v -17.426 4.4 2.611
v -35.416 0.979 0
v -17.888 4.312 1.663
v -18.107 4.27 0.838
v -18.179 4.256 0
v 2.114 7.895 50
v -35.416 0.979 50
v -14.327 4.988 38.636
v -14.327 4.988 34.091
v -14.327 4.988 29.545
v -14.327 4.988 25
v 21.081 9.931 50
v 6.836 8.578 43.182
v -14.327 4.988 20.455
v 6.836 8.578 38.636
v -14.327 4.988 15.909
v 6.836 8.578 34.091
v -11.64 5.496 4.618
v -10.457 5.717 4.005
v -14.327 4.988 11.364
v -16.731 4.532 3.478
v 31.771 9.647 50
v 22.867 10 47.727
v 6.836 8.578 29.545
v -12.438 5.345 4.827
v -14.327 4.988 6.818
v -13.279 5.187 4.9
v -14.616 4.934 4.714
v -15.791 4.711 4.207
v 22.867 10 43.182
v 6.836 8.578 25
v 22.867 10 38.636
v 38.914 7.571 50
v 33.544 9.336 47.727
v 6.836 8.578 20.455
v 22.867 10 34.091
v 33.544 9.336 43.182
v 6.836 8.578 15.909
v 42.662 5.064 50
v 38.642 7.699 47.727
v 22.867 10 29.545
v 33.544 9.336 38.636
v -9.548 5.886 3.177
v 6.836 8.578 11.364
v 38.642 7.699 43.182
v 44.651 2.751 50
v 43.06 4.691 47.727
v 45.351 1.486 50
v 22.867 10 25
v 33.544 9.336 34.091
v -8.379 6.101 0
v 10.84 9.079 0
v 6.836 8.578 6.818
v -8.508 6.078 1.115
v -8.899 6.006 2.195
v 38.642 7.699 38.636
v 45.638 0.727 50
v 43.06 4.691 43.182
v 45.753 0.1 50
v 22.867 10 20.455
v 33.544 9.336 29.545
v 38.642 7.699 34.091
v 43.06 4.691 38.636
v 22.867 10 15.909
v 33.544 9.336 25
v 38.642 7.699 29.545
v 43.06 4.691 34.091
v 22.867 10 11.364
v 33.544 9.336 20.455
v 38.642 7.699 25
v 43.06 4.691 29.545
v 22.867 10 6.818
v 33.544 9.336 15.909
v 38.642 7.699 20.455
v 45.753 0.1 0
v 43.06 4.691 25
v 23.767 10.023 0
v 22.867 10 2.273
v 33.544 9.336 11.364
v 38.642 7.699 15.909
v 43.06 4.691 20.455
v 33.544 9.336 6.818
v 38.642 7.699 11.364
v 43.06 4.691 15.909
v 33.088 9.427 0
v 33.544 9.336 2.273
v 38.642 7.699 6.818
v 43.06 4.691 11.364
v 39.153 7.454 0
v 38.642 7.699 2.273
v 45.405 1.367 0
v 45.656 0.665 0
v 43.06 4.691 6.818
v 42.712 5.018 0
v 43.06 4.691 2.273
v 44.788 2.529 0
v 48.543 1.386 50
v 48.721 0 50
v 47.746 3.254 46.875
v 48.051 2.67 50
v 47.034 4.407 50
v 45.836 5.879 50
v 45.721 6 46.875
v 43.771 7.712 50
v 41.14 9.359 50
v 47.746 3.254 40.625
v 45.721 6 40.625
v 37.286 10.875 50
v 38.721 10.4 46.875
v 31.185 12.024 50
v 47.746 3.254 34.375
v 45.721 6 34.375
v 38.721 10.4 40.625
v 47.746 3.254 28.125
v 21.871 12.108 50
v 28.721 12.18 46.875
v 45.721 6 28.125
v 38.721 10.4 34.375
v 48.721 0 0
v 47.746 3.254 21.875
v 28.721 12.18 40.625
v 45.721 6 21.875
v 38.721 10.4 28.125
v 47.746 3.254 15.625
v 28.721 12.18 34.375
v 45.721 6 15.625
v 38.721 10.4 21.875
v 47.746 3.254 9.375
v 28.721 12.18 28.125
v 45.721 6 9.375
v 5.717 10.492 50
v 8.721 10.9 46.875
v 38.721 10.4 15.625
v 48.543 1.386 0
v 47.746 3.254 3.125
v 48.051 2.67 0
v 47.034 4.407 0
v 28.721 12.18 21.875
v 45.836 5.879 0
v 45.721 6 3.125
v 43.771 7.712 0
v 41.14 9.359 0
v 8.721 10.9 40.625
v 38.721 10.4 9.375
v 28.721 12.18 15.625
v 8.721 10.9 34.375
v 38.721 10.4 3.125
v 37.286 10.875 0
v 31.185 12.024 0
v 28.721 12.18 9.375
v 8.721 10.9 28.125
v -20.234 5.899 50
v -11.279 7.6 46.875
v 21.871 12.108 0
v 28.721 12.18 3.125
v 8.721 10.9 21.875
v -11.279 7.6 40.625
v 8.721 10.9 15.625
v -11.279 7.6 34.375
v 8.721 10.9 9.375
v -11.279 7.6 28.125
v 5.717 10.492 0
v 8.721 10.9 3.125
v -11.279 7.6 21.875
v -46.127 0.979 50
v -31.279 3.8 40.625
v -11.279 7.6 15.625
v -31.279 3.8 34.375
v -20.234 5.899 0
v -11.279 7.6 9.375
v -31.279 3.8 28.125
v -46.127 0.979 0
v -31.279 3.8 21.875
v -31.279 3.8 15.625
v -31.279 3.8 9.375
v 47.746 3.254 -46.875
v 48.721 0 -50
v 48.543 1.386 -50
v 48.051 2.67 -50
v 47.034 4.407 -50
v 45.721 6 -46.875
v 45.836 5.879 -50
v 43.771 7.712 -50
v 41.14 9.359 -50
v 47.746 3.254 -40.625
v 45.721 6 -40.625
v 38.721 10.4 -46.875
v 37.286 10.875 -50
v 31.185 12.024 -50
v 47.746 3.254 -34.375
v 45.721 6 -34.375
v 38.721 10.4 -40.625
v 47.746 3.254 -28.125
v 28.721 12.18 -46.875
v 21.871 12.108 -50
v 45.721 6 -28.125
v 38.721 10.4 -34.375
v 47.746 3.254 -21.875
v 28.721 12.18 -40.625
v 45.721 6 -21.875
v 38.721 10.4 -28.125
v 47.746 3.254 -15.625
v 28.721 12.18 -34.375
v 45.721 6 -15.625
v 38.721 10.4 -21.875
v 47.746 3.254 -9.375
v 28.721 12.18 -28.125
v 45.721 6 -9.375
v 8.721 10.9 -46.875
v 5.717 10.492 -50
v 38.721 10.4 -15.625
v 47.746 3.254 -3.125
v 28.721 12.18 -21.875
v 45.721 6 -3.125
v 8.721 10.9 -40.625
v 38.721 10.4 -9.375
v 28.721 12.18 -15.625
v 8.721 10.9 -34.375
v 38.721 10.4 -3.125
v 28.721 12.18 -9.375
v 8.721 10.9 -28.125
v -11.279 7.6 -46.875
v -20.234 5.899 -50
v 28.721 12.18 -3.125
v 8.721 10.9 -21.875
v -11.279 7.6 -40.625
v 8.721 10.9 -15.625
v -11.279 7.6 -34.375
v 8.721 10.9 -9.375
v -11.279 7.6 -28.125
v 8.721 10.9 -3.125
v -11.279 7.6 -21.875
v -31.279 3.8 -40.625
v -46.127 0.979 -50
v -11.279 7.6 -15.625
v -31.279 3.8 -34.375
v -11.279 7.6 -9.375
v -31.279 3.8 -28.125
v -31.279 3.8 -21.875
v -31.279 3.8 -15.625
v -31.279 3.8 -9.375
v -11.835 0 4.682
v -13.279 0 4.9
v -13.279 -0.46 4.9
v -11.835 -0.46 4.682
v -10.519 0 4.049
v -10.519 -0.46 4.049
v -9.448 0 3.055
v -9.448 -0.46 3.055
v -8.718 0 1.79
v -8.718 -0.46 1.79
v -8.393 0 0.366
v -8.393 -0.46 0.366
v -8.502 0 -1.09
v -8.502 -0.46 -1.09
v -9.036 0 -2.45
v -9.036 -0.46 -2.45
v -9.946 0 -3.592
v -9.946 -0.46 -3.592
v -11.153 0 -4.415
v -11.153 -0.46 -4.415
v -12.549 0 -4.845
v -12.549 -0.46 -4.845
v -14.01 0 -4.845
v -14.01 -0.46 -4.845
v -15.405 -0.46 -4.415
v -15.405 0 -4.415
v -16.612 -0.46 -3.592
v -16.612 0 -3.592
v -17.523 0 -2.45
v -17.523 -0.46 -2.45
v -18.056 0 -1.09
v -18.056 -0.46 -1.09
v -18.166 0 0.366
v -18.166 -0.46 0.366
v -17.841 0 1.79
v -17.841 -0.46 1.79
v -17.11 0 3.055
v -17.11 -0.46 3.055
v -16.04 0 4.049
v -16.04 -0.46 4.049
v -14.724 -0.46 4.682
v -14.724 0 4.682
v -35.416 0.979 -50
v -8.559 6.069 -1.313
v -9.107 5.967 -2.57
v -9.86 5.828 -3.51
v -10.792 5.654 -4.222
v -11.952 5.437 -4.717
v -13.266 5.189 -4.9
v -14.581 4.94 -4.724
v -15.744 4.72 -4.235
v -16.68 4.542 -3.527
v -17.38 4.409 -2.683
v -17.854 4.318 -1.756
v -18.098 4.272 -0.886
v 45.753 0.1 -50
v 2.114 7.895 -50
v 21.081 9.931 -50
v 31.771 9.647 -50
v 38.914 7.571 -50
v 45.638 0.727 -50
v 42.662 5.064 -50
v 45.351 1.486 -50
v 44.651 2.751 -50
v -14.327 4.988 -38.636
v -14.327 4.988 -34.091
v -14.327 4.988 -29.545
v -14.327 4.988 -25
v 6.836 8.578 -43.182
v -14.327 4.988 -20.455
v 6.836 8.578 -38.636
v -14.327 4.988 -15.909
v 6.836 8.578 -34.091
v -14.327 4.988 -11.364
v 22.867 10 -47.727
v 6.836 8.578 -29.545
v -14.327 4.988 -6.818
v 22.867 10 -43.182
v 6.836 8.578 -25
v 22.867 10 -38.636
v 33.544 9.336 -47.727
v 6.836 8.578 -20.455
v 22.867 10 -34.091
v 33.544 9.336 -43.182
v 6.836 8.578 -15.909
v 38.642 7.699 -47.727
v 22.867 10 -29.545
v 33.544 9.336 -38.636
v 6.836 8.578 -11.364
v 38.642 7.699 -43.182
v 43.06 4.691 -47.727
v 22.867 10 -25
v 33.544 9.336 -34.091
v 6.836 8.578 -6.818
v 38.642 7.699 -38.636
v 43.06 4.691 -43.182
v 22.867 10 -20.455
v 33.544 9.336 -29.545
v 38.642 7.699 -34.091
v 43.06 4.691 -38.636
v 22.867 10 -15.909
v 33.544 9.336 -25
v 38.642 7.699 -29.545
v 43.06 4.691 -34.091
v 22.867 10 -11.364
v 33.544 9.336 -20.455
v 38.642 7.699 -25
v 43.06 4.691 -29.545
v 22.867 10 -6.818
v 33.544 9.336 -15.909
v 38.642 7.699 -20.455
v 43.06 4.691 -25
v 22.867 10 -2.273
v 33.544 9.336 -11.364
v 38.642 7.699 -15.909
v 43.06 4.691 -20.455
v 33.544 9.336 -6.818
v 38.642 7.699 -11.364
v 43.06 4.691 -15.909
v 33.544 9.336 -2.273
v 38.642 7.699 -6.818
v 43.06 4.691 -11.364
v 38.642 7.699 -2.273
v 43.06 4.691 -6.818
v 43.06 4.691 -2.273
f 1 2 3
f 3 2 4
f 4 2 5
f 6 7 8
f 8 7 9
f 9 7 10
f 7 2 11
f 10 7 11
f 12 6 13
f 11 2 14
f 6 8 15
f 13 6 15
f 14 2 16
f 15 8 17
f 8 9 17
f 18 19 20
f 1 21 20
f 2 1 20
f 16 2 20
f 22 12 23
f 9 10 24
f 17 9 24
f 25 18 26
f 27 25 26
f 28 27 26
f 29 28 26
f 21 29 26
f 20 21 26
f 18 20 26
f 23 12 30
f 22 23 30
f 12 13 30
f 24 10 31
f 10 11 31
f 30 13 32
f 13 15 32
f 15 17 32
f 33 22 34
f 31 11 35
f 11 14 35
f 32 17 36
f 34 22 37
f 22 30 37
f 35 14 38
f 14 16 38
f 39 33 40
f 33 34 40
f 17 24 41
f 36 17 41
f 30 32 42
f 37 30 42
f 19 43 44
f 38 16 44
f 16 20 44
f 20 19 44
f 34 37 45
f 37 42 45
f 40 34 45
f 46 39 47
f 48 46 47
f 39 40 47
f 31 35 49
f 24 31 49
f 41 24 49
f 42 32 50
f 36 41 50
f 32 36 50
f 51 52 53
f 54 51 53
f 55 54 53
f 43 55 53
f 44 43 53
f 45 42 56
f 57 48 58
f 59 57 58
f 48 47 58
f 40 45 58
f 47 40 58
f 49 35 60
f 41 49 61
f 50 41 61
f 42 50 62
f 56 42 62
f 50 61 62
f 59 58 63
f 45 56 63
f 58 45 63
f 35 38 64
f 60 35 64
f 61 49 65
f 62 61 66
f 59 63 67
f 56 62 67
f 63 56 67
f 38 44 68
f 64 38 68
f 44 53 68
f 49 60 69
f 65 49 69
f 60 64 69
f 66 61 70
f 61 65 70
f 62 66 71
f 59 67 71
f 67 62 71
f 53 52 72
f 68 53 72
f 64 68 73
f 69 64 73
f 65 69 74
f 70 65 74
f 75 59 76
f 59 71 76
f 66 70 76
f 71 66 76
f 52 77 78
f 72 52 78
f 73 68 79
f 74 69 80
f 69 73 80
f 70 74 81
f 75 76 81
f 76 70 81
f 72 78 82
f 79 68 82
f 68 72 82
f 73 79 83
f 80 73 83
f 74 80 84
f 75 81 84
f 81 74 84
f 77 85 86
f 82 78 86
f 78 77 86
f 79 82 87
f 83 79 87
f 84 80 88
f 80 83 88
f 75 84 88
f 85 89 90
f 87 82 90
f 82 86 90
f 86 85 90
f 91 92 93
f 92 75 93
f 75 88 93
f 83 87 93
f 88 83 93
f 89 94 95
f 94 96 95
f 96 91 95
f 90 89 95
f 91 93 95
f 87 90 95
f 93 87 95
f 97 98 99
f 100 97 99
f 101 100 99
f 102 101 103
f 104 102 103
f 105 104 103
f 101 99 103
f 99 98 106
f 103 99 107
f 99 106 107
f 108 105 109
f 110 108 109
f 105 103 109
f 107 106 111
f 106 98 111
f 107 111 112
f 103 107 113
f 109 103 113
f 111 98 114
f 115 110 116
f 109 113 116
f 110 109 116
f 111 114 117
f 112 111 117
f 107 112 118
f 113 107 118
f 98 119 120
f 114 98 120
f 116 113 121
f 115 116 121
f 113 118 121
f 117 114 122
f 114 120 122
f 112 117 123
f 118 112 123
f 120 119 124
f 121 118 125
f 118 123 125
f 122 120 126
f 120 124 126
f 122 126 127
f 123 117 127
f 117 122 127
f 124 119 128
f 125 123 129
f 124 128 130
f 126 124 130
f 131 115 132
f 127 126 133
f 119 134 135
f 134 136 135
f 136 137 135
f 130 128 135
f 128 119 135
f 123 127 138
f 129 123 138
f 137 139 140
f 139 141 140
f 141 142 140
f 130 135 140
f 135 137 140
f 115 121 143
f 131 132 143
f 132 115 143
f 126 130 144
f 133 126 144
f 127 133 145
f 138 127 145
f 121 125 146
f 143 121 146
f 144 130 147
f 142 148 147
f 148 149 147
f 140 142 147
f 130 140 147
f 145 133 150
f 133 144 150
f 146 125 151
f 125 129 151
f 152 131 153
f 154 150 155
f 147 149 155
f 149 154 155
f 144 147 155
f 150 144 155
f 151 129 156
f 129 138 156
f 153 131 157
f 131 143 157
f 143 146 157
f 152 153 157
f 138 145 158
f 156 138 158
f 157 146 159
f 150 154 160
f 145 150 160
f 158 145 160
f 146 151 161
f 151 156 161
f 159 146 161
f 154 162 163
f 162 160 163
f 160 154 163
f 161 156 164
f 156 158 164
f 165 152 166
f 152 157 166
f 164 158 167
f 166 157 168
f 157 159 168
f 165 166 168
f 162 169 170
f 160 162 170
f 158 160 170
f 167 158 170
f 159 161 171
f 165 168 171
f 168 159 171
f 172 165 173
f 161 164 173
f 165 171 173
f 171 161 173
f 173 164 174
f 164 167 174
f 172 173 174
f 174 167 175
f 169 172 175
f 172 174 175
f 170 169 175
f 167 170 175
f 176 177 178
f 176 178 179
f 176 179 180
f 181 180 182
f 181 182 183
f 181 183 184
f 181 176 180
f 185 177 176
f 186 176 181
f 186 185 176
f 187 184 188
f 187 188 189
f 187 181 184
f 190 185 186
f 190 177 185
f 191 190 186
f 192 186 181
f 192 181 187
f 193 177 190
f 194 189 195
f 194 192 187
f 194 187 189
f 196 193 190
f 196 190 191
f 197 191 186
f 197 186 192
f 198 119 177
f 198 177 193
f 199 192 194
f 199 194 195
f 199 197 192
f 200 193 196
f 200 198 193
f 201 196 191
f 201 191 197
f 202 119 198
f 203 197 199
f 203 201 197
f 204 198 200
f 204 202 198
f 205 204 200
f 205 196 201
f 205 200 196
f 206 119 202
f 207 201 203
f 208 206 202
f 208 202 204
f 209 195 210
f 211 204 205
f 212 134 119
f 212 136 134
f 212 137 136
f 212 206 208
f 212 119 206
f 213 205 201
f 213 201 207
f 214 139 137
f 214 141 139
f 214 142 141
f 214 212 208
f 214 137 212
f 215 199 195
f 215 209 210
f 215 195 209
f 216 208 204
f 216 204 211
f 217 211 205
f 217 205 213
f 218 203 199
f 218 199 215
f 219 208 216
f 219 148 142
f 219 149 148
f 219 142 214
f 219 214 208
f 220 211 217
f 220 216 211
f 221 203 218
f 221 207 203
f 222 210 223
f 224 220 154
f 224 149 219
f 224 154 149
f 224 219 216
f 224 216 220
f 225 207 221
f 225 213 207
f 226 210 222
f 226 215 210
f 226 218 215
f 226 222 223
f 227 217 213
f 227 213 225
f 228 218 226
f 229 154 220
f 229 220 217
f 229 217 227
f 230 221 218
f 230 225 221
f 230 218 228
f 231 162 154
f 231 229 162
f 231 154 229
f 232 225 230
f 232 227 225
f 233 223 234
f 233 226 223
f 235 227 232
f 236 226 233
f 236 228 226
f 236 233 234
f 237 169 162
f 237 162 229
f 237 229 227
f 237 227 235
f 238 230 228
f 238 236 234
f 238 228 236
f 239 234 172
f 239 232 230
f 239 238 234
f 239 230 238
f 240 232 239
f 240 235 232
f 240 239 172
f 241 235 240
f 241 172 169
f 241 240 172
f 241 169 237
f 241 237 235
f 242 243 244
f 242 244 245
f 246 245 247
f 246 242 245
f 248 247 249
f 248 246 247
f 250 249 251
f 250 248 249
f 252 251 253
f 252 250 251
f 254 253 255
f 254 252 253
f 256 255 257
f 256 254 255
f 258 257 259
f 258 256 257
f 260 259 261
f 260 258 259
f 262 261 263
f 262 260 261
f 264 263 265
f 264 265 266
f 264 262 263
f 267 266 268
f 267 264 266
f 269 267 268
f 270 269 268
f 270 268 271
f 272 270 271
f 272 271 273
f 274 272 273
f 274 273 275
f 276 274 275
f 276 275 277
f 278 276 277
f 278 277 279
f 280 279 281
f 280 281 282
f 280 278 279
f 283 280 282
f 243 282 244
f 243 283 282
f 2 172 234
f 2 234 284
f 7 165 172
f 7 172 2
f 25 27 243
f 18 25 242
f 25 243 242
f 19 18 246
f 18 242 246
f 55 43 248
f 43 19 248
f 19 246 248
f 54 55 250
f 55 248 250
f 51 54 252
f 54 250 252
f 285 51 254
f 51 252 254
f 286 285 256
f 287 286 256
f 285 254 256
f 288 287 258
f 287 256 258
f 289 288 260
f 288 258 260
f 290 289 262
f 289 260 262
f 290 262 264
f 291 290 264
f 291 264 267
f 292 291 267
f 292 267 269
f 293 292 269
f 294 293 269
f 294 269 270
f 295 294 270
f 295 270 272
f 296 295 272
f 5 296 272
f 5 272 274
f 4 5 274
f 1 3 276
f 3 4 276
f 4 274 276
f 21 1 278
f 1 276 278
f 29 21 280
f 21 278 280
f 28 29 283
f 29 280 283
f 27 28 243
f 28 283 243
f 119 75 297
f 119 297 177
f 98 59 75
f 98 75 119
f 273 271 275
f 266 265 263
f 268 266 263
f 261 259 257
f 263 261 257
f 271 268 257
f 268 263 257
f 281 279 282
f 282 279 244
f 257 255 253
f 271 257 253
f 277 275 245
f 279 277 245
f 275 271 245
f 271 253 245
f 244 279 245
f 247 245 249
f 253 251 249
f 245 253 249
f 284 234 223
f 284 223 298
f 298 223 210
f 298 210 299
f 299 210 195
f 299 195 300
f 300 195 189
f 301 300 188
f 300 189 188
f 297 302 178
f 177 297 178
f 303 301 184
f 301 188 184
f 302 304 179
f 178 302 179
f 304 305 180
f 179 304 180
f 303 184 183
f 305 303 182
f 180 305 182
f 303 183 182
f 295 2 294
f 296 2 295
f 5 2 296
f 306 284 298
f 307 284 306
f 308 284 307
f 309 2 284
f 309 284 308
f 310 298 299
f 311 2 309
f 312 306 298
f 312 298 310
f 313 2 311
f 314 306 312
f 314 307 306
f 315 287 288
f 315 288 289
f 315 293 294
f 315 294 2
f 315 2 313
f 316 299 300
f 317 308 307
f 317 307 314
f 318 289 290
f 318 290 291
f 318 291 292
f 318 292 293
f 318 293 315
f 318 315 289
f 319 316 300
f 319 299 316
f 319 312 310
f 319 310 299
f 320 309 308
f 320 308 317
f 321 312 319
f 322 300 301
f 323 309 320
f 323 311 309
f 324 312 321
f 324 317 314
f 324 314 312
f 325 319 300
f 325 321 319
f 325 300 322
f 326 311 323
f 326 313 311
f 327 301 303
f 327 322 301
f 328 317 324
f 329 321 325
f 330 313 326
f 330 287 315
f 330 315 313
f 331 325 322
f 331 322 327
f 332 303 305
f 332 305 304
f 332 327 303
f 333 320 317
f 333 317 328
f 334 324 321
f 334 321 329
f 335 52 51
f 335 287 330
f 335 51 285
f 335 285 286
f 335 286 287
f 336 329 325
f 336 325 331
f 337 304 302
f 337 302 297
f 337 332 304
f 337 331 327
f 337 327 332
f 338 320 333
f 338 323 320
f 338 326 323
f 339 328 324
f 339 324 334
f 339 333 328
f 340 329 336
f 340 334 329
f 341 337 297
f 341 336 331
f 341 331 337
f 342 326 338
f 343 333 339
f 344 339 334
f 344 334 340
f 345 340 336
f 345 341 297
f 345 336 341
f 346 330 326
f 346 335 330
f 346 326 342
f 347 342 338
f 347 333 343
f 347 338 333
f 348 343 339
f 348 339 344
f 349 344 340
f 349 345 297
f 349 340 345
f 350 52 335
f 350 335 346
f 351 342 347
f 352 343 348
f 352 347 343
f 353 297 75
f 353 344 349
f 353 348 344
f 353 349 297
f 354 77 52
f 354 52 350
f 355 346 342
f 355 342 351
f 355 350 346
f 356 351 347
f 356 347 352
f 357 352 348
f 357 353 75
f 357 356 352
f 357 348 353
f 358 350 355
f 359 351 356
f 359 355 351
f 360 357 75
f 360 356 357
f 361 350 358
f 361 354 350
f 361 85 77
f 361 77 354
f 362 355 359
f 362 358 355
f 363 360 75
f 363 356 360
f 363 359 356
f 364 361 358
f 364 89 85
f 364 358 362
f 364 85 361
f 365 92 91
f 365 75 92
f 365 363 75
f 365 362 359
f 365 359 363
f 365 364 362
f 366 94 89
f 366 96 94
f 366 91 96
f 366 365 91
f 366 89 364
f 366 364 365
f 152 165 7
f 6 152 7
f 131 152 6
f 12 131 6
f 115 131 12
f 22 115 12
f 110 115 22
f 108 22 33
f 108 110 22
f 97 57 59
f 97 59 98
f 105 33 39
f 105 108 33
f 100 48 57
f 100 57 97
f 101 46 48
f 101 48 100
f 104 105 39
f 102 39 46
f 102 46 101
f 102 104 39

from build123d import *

# Parameters (mm, degrees)
BOSS_EXTRUDE1_DEPTH             = 50
BOSS_EXTRUDE2_REACH             = 72.874
SKETCH4_R                       = 4.9
BOSS_EXTRUDE2_DIRECTION_2_DEPTH = 0.46


with BuildPart() as part:
    # Sketch3 → Boss-Extrude1 (new, symmetric)
    with BuildSketch(Plane.XY):
        with BuildLine():
            Line((-46.126968972, 0.978621832), (-35.415500388, 0.978621832))
            add(Edge.make_bspline(
                [(-35.415500388, 0.978621832), (-31.900717337, 1.646356284), (-28.385669806, 2.312644878), (-21.356250818, 3.648918025), (-17.842575491, 4.322708179), (-10.812262333, 5.654093081), (-7.296066509, 6.314104196), (-0.246237667, 7.538800854), (3.289652388, 8.100927369), (10.382593906, 9.05560756), (13.939655637, 9.449931283), (19.294779383, 9.845985299), (21.080534176, 9.94564859), (24.654054204, 10.053814529), (26.441812496, 10.062631968), (29.126639881, 9.931214403), (30.021142665, 9.862531806), (31.793464098, 9.656084843), (32.672832664, 9.517565102), (34.414963225, 9.15422751), (35.277930032, 8.930473985), (36.558652221, 8.523504326), (36.984484861, 8.375558226), (37.823491014, 8.056379668), (38.649942038, 7.713371742), (39.445605832, 7.311930302), (40.222624744, 6.875101272), (40.601901137, 6.639162596), (41.343034868, 6.13422425), (41.706577137, 5.864403259), (42.405097582, 5.299009429), (42.740435419, 5.002707871), (43.379039637, 4.378765248), (43.682854505, 4.051660151), (44.248370211, 3.356297071), (44.509109318, 2.983679064), (44.864883627, 2.405343349), (44.977987263, 2.209593987), (45.193994648, 1.812573614), (45.296445183, 1.611057258), (45.481130702, 1.197080973), (45.56357233, 0.983774864), (45.690582147, 0.549932416), (45.735539216, 0.328490722), (45.752720851, 0.100279614)],
                knots=[0, 0, 0, 0, 0.125, 0.125, 0.25, 0.25, 0.375, 0.375, 0.5, 0.5, 0.625, 0.625, 0.6875, 0.6875, 0.75, 0.75, 0.78125, 0.78125, 0.8125, 0.8125, 0.84375, 0.84375, 0.859375, 0.859375, 0.875, 0.890625, 0.890625, 0.90625, 0.90625, 0.921875, 0.921875, 0.9375, 0.9375, 0.953125, 0.953125, 0.96875, 0.96875, 0.9765625, 0.9765625, 0.984375, 0.984375, 0.9921875, 0.9921875, 1, 1, 1, 1], degree=3))
            Line((45.752720851, 0.100279614), (48.72072986, 0))
            add(Edge.make_bspline(
                [(48.72072986, 0), (48.741252965, 1.211959263), (48.046357201, 2.857215342), (46.815105861, 4.78389108), (45.492517633, 6.302382051), (43.826843254, 7.740810658), (41.494622603, 9.264300756), (38.168076465, 10.717178582), (33.78869279, 11.831530653), (28.729432589, 12.255898832), (23.71704668, 12.218808276), (17.039017695, 11.857586647), (8.690276234, 10.974271434), (-1.304085126, 9.447886993), (-11.287660735, 7.611152922), (-21.278620725, 5.696721586), (-32.895483349, 3.494457071), (-41.17773966, 1.91909956), (-46.126968972, 0.978621832)],
                knots=[0, 0, 0, 0, 0.032626759, 0.049882871, 0.06427589, 0.089250813, 0.111667998, 0.142584384, 0.191135501, 0.238340392, 0.285329255, 0.332381604, 0.426846937, 0.521876031, 0.61736406, 0.713023045, 0.80868203, 0.950714186, 0.950714186, 0.950714186, 0.950714186], degree=3))
        make_face()
    extrude(amount=BOSS_EXTRUDE1_DEPTH, both=True)

    # Sketch4 → Boss-Extrude2 (add, up to next)
    with BuildSketch(Plane(origin=(0, 0, 0), x_dir=(1, 0, 0), z_dir=(0, 1, 0)), mode=Mode.PRIVATE) as boss_extrude2_sk1:
        with Locations((-13.27927014, 0)):
            Circle(SKETCH4_R)
    boss_extrude2_tool1 = extrude(boss_extrude2_sk1.sketch, amount=BOSS_EXTRUDE2_REACH, mode=Mode.PRIVATE) - part.part
    add(boss_extrude2_tool1.solids().sort_by_distance((-13.27927, 0, 0))[0])

    # Sketch4 → Boss-Extrude2 direction 2 (add)
    with BuildSketch(Plane(origin=(0, 0, 0), x_dir=(1, 0, 0), z_dir=(0, 1, 0))):
        with Locations((-13.27927014, 0)):
            Circle(SKETCH4_R)
    extrude(amount=-BOSS_EXTRUDE2_DIRECTION_2_DEPTH)


solid = part.part
